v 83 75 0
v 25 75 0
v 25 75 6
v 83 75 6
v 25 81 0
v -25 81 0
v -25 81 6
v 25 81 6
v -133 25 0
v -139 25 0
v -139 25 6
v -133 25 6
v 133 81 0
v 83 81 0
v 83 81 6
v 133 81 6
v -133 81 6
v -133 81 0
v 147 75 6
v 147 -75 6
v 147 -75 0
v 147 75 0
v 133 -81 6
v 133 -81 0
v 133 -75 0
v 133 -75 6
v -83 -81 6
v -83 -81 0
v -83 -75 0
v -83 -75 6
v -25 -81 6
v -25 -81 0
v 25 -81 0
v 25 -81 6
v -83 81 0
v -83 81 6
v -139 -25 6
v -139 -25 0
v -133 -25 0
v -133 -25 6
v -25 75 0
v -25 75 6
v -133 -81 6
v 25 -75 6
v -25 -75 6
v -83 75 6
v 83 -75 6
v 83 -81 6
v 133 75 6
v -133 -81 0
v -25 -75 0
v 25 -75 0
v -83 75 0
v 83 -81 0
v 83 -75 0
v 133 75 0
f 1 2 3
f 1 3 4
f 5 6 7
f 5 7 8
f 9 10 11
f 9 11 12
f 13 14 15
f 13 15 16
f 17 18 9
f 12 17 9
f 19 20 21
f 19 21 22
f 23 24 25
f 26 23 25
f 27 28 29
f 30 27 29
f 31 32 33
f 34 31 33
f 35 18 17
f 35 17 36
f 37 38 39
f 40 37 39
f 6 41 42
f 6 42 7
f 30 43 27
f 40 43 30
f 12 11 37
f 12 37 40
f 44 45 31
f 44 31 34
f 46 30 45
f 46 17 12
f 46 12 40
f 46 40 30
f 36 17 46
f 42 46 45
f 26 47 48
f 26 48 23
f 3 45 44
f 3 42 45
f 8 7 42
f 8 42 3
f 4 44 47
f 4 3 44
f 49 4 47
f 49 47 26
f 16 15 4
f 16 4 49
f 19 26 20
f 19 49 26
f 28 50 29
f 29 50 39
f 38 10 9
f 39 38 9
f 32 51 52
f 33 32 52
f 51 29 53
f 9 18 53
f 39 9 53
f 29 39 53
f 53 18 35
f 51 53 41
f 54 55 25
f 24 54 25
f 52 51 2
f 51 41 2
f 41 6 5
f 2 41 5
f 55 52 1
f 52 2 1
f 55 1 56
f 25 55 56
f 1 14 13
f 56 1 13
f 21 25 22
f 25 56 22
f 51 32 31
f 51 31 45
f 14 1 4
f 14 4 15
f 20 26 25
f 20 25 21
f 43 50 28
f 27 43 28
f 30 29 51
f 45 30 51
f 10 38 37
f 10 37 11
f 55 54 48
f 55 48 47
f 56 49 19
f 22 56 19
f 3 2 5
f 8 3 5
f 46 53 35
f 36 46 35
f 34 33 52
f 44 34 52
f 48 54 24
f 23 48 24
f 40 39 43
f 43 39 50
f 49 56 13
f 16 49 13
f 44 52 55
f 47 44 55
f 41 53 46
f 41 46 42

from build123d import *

# Parameters (mm, degrees)
CROQUIS1_W              = 266
CROQUIS1_H              = 150
CROQUIS1_W_2            = 50
CROQUIS1_H_2            = 6
CROQUIS1_W_3            = 6
CROQUIS1_H_3            = 50
SALIENTE_EXTRUIR1_DEPTH = 6
CROQUIS3_W              = 14
CROQUIS3_H              = 150
SALIENTE_EXTRUIR4_DEPTH = 6


with BuildPart() as part:
    # Croquis1 → Saliente-Extruir1 (new body)
    with BuildSketch(Plane.XY):
        Rectangle(CROQUIS1_W, CROQUIS1_H)
        with Locations((-108, 78)):
            Rectangle(CROQUIS1_W_2, CROQUIS1_H_2)
        with Locations((0, 78)):
            Rectangle(CROQUIS1_W_2, CROQUIS1_H_2)
        with Locations((-108, -78)):
            Rectangle(CROQUIS1_W_2, CROQUIS1_H_2)
        with Locations((0, -78)):
            Rectangle(CROQUIS1_W_2, CROQUIS1_H_2)
        with Locations((108, -78)):
            Rectangle(CROQUIS1_W_2, CROQUIS1_H_2)
        with Locations((-136, 0)):
            Rectangle(CROQUIS1_W_3, CROQUIS1_H_3)
        with Locations((108, 78)):
            Rectangle(CROQUIS1_W_2, CROQUIS1_H_2)
    extrude(amount=SALIENTE_EXTRUIR1_DEPTH)

    # Croquis3 → Saliente-Extruir4 (add)
    with BuildSketch(Plane.XY.offset(6)):
        with Locations((140, 0)):
            Rectangle(CROQUIS3_W, CROQUIS3_H)
    extrude(amount=-SALIENTE_EXTRUIR4_DEPTH)


solid = part.part
